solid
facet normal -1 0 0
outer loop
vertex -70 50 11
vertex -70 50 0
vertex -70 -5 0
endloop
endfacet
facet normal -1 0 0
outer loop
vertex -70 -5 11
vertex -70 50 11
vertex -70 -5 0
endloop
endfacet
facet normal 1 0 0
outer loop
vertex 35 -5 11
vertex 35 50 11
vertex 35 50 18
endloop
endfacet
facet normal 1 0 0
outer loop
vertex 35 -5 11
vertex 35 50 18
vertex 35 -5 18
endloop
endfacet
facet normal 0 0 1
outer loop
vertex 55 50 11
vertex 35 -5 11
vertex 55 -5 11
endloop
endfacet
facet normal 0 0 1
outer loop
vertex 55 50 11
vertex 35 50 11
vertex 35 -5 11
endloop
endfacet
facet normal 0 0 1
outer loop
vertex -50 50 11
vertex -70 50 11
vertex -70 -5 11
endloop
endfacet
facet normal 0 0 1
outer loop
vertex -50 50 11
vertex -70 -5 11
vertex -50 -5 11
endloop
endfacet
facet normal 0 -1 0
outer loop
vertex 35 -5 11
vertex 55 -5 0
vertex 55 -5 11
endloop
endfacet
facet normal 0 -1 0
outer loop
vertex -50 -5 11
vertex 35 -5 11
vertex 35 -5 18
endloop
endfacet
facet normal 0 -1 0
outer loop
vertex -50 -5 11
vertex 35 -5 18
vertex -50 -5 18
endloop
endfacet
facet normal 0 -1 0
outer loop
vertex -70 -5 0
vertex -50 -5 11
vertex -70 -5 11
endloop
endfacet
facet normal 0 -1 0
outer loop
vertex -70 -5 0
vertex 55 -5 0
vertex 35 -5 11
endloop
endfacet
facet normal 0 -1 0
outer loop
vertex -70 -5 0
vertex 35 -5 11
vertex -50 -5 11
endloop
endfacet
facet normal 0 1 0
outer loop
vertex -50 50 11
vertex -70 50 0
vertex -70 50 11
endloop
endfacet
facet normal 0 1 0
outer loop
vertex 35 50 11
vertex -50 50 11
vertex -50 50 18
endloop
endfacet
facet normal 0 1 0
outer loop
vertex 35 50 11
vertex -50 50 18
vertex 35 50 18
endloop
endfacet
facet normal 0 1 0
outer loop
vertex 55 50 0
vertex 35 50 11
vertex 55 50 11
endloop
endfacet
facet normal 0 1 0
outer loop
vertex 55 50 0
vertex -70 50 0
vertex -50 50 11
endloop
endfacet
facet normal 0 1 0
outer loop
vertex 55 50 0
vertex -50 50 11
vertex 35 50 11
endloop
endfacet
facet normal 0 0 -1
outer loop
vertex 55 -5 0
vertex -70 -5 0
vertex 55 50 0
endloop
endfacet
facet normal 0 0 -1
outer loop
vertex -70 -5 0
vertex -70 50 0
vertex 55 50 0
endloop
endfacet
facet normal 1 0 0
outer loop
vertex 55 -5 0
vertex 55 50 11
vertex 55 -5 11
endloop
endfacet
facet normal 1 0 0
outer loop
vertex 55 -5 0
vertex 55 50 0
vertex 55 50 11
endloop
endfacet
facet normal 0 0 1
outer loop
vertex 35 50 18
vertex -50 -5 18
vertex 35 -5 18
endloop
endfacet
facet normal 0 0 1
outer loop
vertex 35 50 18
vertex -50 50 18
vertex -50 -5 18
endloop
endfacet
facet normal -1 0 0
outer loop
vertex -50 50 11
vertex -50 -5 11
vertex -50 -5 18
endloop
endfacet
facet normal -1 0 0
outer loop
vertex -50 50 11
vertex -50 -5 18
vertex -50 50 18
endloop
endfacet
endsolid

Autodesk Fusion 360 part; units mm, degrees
sketch "Sketch1" plane through (0, 0, 0) normal (0, 0, 1) x (1, 0, 0)
  line L0 (-50, 50) -> (35, 50)
  line L1 (35, 50) -> (35, -5)
  line L2 (35, -5) -> (-50, -5)
  line L3 (-50, -5) -> (-50, 50)
extrude "Extrude1" add sketch "Sketch1" along normal blind 19
extrude "Extrude2" cut 1 faces at (-21.6667, 31.6667, 19) along direction (0, 0, -1) blind 1
sketch "Sketch2" plane through (0, 0, 0) normal (0, 0, 1) x (1, 0, 0)
  line L0 (35, 50) -> (55, 50)
  line L1 (55, 50) -> (55, -5)
  line L2 (55, -5) -> (35, -5)
  line L3 (35, -5) -> (35, 50)
  line L4 (-50, 50) -> (-70, 50)
  line L5 (-70, 50) -> (-70, -5)
  line L6 (-70, -5) -> (-50, -5)
  line L7 (-50, -5) -> (-50, 50)
extrude "Extrude3" add sketch "Sketch2" along normal blind 11
